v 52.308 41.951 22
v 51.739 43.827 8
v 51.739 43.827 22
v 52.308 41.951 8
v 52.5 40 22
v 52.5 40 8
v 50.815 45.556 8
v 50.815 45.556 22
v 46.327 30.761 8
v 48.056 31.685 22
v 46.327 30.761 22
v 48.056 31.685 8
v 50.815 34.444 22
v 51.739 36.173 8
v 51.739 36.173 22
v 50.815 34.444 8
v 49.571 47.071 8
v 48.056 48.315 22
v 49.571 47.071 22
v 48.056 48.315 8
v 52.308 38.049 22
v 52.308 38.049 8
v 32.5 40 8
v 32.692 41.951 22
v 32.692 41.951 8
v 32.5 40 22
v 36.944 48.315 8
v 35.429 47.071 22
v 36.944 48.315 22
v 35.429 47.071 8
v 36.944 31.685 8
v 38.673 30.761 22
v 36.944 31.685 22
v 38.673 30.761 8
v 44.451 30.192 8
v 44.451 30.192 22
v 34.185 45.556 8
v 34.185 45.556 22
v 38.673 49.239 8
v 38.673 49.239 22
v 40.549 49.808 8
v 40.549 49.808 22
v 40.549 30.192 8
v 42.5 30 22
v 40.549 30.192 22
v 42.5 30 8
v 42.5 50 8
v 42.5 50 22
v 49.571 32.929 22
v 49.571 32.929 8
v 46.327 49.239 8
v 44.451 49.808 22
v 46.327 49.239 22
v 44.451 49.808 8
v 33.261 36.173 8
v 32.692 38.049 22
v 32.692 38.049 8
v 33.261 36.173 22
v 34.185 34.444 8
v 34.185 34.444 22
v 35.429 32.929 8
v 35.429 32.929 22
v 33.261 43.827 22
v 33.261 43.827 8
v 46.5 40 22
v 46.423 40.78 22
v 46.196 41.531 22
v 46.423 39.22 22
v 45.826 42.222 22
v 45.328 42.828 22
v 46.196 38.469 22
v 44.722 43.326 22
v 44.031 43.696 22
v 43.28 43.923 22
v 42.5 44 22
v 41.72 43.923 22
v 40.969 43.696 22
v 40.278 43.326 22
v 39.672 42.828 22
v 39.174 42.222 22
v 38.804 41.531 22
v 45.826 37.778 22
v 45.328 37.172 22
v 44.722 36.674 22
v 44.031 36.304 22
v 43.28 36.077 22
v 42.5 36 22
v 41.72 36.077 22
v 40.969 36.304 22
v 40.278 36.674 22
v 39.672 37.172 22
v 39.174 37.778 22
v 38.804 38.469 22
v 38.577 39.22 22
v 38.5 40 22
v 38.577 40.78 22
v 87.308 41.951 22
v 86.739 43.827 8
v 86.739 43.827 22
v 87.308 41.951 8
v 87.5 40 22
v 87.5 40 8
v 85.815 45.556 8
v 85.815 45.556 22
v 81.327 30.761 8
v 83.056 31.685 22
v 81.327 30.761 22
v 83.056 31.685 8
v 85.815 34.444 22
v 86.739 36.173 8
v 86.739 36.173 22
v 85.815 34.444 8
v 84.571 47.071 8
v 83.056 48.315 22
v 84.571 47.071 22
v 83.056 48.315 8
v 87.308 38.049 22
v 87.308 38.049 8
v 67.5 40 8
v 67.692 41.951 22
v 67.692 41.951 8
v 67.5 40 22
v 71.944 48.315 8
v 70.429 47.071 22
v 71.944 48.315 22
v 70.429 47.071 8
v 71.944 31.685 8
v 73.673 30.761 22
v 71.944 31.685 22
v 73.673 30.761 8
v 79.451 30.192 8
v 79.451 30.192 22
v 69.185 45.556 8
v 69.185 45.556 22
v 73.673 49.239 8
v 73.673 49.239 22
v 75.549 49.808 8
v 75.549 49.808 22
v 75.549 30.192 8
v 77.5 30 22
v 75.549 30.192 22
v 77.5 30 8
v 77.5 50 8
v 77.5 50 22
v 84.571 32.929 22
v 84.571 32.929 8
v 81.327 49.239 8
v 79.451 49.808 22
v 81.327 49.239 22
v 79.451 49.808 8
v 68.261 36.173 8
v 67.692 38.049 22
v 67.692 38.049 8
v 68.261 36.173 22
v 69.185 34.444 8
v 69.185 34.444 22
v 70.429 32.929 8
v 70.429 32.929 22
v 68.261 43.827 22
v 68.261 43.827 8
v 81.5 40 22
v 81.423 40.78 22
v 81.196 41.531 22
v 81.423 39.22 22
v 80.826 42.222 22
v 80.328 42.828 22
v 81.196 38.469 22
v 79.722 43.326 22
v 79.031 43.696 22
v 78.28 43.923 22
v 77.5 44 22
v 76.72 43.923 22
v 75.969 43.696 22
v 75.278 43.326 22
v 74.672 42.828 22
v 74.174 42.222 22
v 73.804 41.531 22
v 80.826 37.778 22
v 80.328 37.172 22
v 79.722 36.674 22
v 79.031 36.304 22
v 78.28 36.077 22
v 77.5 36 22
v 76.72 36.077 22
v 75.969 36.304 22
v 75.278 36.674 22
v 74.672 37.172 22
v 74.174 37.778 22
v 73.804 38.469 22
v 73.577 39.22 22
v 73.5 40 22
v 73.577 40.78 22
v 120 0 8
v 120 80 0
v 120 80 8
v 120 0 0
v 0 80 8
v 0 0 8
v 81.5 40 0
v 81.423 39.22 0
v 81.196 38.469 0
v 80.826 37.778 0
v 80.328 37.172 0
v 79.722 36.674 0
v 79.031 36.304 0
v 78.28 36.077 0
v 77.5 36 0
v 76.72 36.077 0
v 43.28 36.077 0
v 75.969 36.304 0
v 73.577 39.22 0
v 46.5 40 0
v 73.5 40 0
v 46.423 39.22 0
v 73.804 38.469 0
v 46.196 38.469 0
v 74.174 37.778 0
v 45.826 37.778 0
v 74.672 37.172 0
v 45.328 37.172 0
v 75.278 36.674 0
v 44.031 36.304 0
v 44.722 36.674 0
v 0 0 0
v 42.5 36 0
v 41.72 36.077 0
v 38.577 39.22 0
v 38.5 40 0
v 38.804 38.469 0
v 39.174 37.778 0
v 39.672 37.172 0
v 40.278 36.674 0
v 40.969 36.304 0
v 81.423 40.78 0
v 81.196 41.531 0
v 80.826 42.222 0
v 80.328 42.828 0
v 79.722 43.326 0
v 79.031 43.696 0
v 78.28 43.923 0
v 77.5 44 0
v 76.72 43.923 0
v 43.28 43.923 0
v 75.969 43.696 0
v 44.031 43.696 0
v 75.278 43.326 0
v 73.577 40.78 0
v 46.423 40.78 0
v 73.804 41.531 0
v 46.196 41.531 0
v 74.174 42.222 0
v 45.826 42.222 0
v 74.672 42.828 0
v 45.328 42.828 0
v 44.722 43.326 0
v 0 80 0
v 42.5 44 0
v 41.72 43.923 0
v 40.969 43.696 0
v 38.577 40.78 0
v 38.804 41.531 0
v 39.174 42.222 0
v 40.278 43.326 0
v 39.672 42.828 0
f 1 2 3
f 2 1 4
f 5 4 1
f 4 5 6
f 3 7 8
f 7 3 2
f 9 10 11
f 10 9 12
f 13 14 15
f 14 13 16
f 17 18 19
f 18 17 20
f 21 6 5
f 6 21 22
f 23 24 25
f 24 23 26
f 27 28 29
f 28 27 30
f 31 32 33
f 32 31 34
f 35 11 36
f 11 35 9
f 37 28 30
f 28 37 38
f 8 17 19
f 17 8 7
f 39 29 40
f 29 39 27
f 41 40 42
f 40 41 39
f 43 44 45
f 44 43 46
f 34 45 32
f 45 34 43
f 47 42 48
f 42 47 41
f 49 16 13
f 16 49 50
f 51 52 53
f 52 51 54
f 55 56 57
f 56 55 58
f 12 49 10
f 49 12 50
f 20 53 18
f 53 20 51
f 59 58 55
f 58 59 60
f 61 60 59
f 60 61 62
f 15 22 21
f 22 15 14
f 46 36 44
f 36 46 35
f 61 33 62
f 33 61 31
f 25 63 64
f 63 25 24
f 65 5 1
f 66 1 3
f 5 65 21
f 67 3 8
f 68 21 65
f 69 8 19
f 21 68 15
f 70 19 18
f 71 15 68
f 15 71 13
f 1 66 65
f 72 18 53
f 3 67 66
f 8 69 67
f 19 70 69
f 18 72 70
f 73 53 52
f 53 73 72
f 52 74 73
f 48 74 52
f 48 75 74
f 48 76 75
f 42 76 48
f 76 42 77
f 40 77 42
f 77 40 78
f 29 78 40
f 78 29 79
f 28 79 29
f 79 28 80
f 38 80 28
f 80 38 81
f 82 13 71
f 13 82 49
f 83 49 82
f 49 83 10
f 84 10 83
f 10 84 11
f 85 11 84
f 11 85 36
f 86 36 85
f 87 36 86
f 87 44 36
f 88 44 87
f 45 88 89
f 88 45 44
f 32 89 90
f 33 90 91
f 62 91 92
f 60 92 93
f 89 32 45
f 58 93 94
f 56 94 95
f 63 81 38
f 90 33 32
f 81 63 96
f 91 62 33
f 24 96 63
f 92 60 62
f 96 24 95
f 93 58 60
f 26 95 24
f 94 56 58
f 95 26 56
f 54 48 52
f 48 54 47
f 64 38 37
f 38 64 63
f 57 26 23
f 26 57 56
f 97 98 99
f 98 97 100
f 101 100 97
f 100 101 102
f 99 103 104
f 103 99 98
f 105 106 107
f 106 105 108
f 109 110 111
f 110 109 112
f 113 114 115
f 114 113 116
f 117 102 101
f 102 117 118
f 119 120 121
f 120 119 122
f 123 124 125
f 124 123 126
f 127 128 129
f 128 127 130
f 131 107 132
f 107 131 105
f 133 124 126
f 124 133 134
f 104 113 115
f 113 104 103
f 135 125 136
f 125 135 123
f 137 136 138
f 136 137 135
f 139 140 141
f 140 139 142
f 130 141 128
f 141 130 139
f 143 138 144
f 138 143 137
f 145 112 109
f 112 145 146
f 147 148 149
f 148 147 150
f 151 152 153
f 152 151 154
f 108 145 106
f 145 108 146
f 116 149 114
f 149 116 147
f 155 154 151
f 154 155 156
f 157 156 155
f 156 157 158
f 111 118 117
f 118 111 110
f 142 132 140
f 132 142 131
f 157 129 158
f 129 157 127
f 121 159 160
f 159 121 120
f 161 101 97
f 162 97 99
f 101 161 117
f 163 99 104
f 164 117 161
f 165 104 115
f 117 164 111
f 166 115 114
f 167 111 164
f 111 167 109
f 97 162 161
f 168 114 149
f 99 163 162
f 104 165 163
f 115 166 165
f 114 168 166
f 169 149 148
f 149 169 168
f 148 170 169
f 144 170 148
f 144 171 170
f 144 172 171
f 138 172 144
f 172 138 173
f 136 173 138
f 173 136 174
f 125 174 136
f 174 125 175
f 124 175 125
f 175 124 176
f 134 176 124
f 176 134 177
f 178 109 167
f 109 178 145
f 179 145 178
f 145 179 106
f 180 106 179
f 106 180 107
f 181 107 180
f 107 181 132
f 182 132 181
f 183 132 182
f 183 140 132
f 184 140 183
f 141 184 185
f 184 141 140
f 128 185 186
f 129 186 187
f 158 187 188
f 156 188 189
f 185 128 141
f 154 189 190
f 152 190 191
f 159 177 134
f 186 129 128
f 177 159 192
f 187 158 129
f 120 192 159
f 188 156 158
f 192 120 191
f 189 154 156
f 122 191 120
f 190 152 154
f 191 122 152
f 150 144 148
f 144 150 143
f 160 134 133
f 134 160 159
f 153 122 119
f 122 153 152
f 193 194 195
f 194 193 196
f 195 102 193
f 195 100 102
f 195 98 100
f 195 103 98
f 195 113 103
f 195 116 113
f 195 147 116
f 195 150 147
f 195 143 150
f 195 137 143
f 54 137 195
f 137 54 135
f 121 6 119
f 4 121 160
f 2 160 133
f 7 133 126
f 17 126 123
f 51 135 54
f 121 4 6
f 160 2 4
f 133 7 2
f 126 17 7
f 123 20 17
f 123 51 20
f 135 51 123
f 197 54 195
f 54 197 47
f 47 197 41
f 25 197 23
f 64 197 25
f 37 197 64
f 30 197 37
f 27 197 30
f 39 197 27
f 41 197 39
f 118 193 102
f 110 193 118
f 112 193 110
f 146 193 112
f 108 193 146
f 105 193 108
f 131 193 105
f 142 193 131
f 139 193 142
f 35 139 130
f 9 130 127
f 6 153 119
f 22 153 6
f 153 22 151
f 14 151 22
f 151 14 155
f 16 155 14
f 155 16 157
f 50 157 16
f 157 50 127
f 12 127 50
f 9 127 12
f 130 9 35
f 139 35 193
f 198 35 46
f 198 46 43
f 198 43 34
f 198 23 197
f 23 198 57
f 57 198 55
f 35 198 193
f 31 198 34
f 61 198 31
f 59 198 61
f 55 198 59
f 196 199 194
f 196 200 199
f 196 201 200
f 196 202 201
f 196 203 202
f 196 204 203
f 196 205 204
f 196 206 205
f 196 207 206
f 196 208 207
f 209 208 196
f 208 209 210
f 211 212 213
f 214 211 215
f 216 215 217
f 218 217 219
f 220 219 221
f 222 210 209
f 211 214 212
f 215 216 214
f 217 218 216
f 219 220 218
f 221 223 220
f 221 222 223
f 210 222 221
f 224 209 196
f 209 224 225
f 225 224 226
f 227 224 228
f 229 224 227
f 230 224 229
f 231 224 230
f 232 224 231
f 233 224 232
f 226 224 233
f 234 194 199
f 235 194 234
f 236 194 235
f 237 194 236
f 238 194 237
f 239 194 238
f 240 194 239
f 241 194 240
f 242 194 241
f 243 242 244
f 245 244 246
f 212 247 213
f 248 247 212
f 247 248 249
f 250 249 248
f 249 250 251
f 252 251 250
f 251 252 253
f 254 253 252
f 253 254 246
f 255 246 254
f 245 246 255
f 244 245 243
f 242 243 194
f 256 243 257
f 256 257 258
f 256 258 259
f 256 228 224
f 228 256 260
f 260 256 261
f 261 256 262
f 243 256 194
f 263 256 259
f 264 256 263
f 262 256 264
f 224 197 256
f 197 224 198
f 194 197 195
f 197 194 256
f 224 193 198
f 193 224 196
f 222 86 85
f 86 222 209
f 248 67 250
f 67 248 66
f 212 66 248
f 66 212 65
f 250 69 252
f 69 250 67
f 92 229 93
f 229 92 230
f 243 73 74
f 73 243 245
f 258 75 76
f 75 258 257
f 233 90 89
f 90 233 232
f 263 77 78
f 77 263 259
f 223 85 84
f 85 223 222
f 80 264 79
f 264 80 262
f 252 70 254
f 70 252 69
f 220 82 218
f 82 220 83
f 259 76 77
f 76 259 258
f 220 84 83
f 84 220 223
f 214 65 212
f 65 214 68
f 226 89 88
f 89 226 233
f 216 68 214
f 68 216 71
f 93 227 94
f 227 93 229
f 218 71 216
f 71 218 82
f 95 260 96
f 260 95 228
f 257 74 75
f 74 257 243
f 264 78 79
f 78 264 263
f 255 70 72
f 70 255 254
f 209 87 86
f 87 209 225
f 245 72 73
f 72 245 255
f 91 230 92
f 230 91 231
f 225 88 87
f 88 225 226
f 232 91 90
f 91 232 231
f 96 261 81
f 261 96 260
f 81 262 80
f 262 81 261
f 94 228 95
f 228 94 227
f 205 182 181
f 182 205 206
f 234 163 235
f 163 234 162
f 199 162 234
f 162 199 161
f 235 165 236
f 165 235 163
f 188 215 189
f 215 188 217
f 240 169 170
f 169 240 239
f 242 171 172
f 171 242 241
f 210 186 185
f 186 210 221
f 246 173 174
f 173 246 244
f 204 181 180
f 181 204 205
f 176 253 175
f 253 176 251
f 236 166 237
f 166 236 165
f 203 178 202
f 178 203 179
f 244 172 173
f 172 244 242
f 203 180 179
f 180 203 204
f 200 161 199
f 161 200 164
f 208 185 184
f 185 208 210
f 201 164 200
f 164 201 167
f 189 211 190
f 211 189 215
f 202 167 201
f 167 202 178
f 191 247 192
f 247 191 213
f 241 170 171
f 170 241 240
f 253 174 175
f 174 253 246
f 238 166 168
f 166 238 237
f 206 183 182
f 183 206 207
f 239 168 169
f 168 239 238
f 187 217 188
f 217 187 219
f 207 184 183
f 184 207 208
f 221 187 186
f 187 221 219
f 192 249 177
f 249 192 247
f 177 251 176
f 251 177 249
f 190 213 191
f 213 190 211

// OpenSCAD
$fn = 32;

// ----------------------------------------------------------------------
// Drill jig: two_boss jig
// ----------------------------------------------------------------------

// --- parameters (mm) ---
plate_l = 120;            // plate length, X
plate_w = 80;             // plate width, Y
plate_t = 8;              // plate thickness
boss_d = 20;              // guide boss diameter
boss_h = 15;              // boss height above the plate
guide_d = 8;              // guide hole diameter
boss_pitch = 35;          // boss pitch

n_boss = 2;  // guide bosses
boss_x0 = (plate_l - (n_boss - 1) * boss_pitch) / 2;  // first boss X
boss_top = plate_t - 1 + boss_h;  // boss crown height
total_h = boss_top;  // overall height

difference() {
  union() {
  cube([plate_l, plate_w, plate_t]);
  for (i = [0 : n_boss - 1])
    translate([boss_x0 + i * boss_pitch, plate_w / 2, plate_t - 1])
      cylinder(h = boss_h, d = boss_d);
  }
  for (i = [0 : n_boss - 1])
    translate([boss_x0 + i * boss_pitch, plate_w / 2, -1])
      cylinder(h = plate_t + boss_h, d = guide_d);
}
